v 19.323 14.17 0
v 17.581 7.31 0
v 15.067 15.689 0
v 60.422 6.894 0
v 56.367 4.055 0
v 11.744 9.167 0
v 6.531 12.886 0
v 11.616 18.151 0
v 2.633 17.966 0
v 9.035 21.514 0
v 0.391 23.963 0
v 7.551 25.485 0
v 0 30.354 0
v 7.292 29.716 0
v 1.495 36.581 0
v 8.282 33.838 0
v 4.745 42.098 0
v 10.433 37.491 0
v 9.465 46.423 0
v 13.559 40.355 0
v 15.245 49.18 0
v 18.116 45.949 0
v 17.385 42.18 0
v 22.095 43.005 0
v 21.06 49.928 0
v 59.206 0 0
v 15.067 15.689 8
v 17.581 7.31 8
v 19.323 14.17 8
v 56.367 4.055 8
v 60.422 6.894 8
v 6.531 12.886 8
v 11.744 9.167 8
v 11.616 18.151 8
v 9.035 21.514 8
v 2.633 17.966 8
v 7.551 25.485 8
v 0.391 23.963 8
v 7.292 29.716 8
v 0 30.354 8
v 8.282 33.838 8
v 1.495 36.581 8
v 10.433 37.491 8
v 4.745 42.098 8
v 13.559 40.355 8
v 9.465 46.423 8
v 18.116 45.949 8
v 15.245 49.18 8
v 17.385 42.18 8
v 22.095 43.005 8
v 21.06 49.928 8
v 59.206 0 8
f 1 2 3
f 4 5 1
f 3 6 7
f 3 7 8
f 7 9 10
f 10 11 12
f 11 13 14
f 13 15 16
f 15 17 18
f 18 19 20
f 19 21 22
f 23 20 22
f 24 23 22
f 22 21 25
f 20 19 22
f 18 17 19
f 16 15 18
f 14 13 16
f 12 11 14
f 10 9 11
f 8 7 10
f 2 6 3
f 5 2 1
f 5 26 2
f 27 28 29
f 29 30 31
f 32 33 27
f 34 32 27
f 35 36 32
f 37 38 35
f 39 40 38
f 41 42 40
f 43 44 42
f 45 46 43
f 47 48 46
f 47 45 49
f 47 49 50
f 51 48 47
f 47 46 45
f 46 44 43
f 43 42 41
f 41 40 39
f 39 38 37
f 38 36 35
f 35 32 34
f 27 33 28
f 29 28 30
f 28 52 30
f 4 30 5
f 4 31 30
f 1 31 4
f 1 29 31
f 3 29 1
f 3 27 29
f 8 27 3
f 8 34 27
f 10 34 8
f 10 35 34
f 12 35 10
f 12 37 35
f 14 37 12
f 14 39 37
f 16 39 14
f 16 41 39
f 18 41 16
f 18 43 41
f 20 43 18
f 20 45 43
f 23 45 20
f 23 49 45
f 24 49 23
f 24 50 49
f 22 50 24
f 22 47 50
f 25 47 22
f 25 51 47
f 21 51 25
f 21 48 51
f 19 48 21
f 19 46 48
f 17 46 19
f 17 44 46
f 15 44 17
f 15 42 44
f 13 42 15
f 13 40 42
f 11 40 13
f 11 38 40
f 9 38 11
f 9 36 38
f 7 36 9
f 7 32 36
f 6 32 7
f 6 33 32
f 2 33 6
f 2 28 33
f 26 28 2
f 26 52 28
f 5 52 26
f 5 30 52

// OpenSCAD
$fn = 32;

// ----------------------------------------------------------------------
// Hook plate: curl radius 18 mm over 170 degrees, 7 mm thick band
// ----------------------------------------------------------------------

// --- parameters (mm) ---
profile_height = 8;       // extrusion height
profile_points = 26;      // points of the closed outline

profile = [[18.116, 45.949], [21.06, 49.928], [15.245, 49.18], [9.465, 46.423], [4.745, 42.098], [1.495, 36.581], [0, 30.354], [0.391, 23.963], [2.633, 17.966], [6.531, 12.886], [11.744, 9.167], [17.581, 7.31], [59.206, 0], [56.367, 4.055], [60.422, 6.894], [19.323, 14.17], [15.067, 15.689], [11.616, 18.151], [9.035, 21.514], [7.551, 25.485], [7.292, 29.716], [8.282, 33.838], [10.433, 37.491], [13.559, 40.355], [17.385, 42.18], [22.095, 43.005]];  // single closed polygon, 26 points, counter clockwise

// --- the one profile operation ---
linear_extrude(height = profile_height) polygon(points = profile);
